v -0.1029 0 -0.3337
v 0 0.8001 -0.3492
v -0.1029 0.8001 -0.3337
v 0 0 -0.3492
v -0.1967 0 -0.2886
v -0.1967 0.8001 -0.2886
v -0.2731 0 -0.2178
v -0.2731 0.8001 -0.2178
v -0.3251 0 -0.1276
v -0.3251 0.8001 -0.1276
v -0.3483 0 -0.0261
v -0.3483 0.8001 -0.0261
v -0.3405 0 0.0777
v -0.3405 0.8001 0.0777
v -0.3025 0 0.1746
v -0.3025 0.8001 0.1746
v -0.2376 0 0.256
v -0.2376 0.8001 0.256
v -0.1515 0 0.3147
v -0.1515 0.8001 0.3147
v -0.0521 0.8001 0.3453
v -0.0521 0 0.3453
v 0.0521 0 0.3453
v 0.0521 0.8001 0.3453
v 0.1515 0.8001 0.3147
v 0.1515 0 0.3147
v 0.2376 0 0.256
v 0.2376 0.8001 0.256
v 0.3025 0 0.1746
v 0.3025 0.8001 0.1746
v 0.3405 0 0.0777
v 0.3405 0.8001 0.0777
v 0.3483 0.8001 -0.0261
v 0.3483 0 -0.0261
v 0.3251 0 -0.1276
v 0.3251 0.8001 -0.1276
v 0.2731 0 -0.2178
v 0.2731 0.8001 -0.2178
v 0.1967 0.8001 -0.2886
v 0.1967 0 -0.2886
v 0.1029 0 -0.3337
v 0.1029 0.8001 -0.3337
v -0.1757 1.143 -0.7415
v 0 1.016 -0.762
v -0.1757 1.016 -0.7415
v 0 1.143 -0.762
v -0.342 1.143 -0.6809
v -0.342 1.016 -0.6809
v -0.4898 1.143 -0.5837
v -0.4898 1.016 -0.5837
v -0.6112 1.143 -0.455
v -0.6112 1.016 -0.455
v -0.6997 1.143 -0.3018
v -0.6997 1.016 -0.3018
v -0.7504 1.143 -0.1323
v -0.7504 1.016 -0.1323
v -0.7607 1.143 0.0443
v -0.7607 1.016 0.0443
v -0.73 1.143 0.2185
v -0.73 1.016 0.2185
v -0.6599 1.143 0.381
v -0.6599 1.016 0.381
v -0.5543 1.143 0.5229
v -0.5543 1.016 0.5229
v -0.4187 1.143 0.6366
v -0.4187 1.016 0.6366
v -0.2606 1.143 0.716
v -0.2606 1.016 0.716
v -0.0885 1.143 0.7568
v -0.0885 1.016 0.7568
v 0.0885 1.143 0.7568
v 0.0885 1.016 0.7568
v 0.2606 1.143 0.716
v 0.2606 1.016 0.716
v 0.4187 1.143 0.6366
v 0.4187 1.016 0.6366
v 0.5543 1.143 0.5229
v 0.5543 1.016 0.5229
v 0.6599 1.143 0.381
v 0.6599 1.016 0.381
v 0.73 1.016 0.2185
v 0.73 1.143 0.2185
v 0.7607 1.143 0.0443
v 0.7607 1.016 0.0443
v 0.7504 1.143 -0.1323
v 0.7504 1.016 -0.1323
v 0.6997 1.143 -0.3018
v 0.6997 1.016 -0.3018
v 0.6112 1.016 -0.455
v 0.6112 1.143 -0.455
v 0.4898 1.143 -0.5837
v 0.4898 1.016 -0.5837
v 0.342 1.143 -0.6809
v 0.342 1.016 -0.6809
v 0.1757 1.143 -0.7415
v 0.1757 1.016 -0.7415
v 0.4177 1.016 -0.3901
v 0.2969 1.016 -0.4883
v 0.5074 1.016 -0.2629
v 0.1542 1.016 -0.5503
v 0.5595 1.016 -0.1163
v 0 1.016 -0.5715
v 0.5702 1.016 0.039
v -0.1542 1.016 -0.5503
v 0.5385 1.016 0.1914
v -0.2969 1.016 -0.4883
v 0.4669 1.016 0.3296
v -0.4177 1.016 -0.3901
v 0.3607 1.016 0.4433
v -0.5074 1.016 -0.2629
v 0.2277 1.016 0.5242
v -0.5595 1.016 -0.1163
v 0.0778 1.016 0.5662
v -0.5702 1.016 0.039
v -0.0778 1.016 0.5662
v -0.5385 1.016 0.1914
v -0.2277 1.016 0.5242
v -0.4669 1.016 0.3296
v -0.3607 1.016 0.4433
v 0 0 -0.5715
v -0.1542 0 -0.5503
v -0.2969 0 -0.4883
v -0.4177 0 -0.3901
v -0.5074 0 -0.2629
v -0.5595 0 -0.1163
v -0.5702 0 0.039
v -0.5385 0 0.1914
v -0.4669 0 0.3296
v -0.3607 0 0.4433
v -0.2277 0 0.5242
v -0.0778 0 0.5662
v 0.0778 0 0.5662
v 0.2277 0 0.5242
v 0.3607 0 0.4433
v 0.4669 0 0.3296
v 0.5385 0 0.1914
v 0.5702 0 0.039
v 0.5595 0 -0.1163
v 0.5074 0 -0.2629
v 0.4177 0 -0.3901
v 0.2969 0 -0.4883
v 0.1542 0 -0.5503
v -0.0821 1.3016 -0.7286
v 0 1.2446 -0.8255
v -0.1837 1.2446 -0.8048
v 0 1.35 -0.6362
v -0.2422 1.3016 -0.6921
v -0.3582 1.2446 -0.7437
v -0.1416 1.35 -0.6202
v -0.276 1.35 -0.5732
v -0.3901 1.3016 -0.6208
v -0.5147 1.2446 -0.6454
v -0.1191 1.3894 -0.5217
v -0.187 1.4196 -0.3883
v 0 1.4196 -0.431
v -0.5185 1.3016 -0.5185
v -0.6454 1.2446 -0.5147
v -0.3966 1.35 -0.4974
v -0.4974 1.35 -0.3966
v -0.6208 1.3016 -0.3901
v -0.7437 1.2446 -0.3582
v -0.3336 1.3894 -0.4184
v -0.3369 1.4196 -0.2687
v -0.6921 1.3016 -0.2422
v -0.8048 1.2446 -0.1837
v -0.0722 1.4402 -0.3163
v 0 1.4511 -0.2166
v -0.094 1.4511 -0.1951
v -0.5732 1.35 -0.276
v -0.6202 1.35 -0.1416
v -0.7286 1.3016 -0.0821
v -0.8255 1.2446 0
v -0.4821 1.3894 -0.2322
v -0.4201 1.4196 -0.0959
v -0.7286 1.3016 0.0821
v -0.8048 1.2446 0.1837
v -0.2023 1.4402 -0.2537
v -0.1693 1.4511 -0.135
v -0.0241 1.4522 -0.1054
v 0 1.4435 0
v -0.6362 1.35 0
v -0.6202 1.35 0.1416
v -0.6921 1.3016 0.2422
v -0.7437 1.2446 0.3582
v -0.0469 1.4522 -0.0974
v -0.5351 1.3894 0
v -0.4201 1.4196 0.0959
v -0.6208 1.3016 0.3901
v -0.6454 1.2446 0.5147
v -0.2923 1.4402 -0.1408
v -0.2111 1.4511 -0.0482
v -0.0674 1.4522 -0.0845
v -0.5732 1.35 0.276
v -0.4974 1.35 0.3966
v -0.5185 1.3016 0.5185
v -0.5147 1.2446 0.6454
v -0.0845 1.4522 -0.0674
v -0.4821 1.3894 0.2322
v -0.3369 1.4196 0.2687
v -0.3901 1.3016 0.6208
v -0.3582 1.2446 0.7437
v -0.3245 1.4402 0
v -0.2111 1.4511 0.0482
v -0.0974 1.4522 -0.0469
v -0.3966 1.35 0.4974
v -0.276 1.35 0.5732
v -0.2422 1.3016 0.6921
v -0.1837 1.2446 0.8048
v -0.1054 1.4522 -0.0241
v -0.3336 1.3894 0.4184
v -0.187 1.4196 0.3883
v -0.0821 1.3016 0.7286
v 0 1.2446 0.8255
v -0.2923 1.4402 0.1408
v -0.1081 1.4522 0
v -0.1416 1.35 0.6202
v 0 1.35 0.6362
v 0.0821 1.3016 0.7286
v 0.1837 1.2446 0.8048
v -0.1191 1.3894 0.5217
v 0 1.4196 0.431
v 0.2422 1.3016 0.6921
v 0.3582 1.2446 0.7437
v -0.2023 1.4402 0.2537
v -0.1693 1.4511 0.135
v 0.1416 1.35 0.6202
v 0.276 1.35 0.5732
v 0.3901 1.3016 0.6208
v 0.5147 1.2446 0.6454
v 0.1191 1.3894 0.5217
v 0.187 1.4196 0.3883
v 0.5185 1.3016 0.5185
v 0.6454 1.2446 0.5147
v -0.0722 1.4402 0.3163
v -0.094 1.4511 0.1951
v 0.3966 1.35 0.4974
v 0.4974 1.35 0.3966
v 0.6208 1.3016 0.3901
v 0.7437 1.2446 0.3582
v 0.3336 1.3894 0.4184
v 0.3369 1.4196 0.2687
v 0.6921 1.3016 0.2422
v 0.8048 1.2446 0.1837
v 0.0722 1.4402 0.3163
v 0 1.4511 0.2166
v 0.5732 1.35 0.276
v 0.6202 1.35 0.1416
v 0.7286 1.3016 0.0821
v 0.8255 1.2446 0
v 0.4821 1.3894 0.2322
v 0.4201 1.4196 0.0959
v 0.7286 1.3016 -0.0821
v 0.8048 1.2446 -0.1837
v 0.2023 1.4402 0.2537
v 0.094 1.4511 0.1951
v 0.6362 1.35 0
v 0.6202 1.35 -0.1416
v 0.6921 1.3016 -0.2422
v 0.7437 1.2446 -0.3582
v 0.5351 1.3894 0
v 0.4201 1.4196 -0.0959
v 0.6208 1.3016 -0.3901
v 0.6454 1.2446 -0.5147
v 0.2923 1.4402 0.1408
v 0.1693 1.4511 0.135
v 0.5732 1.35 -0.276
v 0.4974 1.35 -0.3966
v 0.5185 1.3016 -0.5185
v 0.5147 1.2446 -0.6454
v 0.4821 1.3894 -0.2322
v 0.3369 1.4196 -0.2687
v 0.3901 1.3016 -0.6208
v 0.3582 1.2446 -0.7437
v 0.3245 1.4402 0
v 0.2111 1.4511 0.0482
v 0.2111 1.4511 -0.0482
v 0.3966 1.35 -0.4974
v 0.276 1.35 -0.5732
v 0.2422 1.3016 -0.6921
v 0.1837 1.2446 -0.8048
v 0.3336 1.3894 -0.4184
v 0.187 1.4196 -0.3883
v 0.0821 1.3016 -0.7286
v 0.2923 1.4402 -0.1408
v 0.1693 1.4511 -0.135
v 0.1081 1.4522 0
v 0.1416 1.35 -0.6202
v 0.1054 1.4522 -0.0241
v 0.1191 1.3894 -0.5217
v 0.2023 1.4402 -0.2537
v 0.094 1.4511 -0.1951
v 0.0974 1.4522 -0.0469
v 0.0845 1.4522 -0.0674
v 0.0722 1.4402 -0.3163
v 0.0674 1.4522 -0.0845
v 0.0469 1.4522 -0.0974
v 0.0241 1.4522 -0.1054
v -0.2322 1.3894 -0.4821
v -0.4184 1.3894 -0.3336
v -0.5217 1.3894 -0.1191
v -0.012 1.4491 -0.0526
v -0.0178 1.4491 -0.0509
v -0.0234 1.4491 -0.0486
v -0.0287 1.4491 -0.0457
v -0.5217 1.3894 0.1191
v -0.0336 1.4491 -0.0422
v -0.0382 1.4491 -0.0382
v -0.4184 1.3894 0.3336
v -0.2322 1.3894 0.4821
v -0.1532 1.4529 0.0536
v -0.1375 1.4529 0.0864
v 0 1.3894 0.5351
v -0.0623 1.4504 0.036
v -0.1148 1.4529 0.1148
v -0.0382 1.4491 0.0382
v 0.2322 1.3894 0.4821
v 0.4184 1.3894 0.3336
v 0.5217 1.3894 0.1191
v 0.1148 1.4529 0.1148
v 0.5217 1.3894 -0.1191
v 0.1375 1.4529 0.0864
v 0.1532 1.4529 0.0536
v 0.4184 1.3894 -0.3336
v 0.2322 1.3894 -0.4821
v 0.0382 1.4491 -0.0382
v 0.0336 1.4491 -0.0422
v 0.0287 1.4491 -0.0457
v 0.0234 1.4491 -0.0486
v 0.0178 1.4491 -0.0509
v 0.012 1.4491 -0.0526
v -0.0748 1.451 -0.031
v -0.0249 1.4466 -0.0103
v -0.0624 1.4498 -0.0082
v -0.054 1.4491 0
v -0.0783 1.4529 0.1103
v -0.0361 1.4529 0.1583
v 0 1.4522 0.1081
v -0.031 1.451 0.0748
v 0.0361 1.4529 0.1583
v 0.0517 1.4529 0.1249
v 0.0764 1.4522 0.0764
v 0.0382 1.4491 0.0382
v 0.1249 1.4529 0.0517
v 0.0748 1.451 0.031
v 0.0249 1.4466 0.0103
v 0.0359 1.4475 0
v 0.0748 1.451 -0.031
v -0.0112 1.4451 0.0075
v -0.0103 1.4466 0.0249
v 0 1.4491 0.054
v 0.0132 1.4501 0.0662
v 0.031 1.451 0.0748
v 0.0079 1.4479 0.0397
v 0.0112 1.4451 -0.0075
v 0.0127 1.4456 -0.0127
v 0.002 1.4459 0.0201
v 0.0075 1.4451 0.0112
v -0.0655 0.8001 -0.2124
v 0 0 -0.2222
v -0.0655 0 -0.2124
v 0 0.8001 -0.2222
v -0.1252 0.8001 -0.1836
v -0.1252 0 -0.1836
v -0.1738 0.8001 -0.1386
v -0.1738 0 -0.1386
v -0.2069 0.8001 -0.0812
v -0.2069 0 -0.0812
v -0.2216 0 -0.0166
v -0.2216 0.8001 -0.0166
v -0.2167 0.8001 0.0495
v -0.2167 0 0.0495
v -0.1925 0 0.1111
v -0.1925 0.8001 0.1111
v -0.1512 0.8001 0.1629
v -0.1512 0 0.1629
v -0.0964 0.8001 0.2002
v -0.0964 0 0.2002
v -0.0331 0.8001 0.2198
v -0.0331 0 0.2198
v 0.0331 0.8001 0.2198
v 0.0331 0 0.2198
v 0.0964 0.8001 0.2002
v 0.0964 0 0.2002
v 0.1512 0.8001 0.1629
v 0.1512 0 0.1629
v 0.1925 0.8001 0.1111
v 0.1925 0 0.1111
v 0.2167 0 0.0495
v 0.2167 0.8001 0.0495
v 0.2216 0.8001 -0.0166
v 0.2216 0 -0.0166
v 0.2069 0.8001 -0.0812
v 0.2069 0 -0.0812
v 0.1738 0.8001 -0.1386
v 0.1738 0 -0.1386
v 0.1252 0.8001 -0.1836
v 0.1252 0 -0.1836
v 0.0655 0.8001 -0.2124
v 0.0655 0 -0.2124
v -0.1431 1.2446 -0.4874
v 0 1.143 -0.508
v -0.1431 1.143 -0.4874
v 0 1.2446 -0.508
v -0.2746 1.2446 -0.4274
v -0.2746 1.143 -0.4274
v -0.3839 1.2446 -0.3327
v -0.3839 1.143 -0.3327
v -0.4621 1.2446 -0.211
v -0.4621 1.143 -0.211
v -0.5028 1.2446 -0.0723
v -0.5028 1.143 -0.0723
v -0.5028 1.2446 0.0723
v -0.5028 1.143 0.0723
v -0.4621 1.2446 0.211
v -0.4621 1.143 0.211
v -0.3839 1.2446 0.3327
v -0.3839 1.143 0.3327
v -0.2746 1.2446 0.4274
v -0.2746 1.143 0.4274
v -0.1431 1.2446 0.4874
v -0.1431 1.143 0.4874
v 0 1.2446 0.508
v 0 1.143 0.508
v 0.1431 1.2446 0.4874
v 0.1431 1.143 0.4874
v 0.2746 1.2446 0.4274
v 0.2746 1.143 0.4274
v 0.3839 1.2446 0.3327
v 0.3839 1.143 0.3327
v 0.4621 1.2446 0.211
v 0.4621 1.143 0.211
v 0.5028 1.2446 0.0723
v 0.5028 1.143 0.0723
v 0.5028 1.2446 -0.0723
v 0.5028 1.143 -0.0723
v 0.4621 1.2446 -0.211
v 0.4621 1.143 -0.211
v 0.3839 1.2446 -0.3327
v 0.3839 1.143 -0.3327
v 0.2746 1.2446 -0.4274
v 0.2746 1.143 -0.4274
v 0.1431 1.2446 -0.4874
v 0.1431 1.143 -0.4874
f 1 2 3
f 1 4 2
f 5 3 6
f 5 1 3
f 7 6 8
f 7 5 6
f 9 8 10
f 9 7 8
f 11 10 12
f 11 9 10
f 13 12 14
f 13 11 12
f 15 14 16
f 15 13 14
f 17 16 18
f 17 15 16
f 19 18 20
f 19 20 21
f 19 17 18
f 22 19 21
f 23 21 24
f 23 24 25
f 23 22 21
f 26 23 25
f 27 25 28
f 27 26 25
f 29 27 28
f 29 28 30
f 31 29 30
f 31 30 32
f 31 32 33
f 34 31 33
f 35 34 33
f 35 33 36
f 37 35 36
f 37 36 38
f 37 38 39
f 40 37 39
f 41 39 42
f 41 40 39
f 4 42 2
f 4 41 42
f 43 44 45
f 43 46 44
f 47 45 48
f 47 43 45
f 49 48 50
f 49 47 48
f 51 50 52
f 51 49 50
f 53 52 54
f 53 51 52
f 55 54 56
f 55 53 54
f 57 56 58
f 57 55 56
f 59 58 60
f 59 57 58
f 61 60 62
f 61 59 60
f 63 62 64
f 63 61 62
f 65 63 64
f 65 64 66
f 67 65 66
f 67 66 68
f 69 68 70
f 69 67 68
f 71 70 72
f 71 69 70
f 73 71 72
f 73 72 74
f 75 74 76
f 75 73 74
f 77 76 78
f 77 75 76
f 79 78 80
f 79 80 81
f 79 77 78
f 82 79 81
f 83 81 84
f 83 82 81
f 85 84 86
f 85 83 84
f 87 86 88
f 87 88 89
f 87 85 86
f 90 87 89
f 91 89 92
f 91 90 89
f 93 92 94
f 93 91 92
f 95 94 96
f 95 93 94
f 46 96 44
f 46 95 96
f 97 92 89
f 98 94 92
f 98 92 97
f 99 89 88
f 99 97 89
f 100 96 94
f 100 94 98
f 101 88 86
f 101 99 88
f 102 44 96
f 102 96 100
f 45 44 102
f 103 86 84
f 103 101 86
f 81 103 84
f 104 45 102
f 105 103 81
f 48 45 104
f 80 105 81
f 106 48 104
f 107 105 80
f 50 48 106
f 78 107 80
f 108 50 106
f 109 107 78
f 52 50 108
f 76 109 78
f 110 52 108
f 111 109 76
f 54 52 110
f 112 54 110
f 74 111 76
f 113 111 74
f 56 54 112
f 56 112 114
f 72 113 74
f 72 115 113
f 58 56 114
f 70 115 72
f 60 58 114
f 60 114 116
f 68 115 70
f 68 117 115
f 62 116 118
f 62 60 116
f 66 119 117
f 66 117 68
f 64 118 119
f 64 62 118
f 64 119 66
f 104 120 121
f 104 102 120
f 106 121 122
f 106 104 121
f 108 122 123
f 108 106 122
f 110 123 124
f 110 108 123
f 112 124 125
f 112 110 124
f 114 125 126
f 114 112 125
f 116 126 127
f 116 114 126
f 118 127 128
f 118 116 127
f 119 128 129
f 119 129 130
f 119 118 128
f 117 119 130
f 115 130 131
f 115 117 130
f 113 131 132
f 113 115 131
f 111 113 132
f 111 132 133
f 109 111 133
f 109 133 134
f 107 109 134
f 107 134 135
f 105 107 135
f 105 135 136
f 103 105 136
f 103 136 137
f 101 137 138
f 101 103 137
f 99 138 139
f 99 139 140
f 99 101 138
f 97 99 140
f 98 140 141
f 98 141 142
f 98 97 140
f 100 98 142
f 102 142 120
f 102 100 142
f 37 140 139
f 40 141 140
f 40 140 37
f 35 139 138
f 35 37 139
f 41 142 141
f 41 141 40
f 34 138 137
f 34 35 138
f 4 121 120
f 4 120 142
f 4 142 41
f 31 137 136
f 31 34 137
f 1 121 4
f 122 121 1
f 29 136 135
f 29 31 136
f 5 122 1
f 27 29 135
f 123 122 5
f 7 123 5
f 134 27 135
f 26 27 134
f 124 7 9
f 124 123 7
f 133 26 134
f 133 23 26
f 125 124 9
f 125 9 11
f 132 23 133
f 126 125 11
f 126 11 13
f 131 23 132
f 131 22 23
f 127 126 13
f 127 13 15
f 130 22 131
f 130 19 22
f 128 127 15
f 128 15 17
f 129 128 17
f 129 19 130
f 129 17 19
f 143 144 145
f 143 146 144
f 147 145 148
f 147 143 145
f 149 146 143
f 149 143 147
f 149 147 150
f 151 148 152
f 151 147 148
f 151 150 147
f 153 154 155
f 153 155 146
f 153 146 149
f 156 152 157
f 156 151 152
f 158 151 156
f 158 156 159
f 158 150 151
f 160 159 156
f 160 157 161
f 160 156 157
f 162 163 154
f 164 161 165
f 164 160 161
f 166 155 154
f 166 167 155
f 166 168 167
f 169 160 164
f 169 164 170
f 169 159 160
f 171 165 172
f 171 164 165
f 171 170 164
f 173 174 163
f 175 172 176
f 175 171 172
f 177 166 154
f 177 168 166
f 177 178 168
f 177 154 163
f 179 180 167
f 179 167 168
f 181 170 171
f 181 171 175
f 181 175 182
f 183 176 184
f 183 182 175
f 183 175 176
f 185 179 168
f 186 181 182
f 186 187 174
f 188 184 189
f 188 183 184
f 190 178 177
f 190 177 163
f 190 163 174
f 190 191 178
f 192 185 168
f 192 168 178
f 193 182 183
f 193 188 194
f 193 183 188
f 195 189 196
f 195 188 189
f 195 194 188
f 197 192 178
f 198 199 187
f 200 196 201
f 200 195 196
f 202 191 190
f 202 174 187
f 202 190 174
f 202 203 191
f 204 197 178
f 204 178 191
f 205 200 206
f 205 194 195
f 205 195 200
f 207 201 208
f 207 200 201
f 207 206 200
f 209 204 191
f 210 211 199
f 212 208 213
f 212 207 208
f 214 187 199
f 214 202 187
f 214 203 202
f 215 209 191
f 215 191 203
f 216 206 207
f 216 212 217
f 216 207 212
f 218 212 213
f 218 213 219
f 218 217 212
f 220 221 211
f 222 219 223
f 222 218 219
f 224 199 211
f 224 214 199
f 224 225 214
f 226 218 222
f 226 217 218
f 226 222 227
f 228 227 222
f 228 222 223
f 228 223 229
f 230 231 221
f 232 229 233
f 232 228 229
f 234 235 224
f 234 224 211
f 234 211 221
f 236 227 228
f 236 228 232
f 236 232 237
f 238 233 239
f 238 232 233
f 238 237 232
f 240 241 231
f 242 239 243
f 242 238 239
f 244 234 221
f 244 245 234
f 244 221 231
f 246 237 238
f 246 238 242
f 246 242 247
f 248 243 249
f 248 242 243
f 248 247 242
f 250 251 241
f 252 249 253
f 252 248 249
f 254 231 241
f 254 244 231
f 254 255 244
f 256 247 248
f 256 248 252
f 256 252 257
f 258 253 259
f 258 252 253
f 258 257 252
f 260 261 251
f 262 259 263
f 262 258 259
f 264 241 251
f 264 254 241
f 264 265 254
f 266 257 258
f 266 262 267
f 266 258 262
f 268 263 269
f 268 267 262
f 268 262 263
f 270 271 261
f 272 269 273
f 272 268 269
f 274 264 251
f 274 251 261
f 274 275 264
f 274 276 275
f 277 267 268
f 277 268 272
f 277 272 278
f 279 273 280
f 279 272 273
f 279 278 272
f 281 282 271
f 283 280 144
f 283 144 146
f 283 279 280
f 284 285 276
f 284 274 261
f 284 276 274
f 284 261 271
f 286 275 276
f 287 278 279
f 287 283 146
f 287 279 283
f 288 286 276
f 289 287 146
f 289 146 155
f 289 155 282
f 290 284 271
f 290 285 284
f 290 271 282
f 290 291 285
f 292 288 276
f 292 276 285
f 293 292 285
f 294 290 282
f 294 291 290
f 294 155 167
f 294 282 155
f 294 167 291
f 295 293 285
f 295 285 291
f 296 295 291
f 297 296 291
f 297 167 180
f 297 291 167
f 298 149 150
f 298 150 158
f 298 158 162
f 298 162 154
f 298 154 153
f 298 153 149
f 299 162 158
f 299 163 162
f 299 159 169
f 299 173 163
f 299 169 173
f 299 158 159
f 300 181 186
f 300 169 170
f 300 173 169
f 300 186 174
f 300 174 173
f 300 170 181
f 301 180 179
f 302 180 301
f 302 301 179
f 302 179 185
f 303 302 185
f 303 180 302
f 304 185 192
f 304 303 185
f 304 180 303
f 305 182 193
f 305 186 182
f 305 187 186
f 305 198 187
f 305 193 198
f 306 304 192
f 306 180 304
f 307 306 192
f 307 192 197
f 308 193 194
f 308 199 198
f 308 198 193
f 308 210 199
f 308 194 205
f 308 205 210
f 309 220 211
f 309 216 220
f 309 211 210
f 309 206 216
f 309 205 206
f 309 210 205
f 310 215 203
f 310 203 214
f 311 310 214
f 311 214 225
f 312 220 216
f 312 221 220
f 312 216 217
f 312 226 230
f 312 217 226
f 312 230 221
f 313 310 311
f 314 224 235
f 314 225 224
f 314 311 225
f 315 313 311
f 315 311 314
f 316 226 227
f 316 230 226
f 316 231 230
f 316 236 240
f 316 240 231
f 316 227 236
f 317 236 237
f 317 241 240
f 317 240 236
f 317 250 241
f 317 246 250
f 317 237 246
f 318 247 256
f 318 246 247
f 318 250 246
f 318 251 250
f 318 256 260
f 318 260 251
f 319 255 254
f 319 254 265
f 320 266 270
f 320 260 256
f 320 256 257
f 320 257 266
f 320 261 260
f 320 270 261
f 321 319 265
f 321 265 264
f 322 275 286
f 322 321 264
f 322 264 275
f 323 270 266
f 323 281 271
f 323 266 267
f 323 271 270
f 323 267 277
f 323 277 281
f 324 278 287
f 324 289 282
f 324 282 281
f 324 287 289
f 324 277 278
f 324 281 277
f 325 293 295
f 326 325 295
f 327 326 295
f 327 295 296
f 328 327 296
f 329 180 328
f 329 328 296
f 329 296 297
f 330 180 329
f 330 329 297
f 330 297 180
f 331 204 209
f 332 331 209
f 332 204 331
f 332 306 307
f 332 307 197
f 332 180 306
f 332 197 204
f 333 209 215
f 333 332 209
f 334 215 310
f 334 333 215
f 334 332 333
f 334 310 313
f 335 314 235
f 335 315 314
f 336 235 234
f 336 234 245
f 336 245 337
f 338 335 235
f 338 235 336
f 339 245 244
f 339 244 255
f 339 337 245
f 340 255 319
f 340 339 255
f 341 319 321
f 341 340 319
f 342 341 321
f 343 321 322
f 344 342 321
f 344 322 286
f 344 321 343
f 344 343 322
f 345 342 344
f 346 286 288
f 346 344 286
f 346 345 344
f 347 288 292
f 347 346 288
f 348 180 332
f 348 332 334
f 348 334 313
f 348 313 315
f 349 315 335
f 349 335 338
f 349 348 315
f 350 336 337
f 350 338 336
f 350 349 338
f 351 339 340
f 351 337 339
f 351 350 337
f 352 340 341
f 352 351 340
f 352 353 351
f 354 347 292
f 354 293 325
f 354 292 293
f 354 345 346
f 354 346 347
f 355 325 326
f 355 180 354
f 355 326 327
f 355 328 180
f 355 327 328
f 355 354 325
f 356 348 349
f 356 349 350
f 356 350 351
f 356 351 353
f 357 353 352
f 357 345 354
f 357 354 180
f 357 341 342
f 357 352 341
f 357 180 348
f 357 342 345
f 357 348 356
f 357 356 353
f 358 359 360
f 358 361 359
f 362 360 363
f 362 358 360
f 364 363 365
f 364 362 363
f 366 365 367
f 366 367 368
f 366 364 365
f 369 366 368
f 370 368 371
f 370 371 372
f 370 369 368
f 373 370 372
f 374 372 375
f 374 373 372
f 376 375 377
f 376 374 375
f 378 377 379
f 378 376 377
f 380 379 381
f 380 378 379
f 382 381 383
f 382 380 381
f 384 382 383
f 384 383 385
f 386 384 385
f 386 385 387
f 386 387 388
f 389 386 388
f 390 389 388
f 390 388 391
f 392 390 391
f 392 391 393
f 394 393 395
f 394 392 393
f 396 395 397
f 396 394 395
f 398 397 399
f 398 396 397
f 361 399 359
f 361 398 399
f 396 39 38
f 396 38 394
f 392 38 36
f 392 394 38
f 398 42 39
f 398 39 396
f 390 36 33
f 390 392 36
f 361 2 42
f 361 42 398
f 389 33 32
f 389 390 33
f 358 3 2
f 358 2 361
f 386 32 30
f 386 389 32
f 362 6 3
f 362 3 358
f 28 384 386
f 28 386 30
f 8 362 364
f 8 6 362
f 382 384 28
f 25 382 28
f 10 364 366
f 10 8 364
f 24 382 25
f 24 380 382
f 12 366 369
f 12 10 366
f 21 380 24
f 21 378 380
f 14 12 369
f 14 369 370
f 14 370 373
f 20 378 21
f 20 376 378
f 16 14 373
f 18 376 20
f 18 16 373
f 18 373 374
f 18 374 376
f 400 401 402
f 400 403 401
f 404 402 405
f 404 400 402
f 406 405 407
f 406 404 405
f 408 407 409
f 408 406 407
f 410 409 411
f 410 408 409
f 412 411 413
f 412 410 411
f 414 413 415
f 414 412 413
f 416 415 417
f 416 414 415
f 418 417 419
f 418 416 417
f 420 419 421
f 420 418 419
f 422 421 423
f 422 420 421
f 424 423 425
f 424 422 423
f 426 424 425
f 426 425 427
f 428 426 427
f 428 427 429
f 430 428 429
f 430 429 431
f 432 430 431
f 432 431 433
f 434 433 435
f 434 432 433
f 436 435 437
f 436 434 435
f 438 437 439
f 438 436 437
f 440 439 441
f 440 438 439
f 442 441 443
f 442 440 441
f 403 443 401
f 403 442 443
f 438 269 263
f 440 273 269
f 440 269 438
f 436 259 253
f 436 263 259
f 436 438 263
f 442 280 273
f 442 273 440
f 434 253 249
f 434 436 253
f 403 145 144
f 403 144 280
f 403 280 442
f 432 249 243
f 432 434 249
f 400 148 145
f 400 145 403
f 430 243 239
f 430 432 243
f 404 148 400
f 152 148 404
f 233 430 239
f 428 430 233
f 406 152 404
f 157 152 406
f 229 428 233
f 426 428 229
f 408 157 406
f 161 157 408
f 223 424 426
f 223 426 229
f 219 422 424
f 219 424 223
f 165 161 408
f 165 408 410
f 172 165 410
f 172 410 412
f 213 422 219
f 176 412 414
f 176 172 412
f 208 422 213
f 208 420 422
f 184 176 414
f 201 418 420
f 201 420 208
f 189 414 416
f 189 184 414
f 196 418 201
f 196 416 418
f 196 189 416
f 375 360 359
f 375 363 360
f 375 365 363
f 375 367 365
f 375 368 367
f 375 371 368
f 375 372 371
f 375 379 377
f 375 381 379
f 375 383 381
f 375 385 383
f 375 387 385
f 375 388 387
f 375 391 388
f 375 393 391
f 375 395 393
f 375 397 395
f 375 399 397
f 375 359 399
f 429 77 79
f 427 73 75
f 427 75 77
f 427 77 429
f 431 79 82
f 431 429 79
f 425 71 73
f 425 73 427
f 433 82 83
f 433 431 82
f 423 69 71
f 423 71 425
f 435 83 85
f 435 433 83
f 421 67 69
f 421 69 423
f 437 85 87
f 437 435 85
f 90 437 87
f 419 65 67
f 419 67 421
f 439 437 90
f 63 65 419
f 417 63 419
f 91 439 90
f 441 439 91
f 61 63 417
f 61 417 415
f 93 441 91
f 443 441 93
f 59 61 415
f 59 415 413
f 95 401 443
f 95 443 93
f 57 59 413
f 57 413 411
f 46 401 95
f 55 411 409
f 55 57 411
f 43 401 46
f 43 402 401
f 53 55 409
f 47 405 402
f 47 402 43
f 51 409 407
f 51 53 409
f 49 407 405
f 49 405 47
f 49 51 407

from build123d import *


with BuildPart() as part:
    # Sketch1 → Revolve1 (revolve)
    with BuildSketch(Plane.XY, mode=Mode.PRIVATE) as revolve1_sk:
        with BuildLine():
            Line((0, 0), (0.22225, 0))
            Line((0.22225, 0), (0.22225, 0.8001))
            Line((0.22225, 0.8001), (0.34925, 0.8001))
            Line((0.34925, 0.8001), (0.34925, 0))
            Line((0.34925, 0), (0.5715, 0))
            Line((0.5715, 0), (0.5715, 1.016))
            Line((0.5715, 1.016), (0.762, 1.016))
            Line((0.762, 1.016), (0.762, 1.143))
            Line((0.762, 1.143), (0.508, 1.143))
            Line((0.508, 1.143), (0.508, 1.2446))
            Line((0.508, 1.2446), (0.8255, 1.2446))
            ThreePointArc((0.8255, 1.2446), (0.430950097, 1.419588625), (0, 1.443518904))
            Line((0, 1.443518904), (0, 0))
        make_face()
    revolve(revolve1_sk.sketch.rotate(Axis((0, 0, 0), (0, 1, 0)), 90), axis=Axis((0, 0, 0), (0, 1, 0)))


solid = part.part
